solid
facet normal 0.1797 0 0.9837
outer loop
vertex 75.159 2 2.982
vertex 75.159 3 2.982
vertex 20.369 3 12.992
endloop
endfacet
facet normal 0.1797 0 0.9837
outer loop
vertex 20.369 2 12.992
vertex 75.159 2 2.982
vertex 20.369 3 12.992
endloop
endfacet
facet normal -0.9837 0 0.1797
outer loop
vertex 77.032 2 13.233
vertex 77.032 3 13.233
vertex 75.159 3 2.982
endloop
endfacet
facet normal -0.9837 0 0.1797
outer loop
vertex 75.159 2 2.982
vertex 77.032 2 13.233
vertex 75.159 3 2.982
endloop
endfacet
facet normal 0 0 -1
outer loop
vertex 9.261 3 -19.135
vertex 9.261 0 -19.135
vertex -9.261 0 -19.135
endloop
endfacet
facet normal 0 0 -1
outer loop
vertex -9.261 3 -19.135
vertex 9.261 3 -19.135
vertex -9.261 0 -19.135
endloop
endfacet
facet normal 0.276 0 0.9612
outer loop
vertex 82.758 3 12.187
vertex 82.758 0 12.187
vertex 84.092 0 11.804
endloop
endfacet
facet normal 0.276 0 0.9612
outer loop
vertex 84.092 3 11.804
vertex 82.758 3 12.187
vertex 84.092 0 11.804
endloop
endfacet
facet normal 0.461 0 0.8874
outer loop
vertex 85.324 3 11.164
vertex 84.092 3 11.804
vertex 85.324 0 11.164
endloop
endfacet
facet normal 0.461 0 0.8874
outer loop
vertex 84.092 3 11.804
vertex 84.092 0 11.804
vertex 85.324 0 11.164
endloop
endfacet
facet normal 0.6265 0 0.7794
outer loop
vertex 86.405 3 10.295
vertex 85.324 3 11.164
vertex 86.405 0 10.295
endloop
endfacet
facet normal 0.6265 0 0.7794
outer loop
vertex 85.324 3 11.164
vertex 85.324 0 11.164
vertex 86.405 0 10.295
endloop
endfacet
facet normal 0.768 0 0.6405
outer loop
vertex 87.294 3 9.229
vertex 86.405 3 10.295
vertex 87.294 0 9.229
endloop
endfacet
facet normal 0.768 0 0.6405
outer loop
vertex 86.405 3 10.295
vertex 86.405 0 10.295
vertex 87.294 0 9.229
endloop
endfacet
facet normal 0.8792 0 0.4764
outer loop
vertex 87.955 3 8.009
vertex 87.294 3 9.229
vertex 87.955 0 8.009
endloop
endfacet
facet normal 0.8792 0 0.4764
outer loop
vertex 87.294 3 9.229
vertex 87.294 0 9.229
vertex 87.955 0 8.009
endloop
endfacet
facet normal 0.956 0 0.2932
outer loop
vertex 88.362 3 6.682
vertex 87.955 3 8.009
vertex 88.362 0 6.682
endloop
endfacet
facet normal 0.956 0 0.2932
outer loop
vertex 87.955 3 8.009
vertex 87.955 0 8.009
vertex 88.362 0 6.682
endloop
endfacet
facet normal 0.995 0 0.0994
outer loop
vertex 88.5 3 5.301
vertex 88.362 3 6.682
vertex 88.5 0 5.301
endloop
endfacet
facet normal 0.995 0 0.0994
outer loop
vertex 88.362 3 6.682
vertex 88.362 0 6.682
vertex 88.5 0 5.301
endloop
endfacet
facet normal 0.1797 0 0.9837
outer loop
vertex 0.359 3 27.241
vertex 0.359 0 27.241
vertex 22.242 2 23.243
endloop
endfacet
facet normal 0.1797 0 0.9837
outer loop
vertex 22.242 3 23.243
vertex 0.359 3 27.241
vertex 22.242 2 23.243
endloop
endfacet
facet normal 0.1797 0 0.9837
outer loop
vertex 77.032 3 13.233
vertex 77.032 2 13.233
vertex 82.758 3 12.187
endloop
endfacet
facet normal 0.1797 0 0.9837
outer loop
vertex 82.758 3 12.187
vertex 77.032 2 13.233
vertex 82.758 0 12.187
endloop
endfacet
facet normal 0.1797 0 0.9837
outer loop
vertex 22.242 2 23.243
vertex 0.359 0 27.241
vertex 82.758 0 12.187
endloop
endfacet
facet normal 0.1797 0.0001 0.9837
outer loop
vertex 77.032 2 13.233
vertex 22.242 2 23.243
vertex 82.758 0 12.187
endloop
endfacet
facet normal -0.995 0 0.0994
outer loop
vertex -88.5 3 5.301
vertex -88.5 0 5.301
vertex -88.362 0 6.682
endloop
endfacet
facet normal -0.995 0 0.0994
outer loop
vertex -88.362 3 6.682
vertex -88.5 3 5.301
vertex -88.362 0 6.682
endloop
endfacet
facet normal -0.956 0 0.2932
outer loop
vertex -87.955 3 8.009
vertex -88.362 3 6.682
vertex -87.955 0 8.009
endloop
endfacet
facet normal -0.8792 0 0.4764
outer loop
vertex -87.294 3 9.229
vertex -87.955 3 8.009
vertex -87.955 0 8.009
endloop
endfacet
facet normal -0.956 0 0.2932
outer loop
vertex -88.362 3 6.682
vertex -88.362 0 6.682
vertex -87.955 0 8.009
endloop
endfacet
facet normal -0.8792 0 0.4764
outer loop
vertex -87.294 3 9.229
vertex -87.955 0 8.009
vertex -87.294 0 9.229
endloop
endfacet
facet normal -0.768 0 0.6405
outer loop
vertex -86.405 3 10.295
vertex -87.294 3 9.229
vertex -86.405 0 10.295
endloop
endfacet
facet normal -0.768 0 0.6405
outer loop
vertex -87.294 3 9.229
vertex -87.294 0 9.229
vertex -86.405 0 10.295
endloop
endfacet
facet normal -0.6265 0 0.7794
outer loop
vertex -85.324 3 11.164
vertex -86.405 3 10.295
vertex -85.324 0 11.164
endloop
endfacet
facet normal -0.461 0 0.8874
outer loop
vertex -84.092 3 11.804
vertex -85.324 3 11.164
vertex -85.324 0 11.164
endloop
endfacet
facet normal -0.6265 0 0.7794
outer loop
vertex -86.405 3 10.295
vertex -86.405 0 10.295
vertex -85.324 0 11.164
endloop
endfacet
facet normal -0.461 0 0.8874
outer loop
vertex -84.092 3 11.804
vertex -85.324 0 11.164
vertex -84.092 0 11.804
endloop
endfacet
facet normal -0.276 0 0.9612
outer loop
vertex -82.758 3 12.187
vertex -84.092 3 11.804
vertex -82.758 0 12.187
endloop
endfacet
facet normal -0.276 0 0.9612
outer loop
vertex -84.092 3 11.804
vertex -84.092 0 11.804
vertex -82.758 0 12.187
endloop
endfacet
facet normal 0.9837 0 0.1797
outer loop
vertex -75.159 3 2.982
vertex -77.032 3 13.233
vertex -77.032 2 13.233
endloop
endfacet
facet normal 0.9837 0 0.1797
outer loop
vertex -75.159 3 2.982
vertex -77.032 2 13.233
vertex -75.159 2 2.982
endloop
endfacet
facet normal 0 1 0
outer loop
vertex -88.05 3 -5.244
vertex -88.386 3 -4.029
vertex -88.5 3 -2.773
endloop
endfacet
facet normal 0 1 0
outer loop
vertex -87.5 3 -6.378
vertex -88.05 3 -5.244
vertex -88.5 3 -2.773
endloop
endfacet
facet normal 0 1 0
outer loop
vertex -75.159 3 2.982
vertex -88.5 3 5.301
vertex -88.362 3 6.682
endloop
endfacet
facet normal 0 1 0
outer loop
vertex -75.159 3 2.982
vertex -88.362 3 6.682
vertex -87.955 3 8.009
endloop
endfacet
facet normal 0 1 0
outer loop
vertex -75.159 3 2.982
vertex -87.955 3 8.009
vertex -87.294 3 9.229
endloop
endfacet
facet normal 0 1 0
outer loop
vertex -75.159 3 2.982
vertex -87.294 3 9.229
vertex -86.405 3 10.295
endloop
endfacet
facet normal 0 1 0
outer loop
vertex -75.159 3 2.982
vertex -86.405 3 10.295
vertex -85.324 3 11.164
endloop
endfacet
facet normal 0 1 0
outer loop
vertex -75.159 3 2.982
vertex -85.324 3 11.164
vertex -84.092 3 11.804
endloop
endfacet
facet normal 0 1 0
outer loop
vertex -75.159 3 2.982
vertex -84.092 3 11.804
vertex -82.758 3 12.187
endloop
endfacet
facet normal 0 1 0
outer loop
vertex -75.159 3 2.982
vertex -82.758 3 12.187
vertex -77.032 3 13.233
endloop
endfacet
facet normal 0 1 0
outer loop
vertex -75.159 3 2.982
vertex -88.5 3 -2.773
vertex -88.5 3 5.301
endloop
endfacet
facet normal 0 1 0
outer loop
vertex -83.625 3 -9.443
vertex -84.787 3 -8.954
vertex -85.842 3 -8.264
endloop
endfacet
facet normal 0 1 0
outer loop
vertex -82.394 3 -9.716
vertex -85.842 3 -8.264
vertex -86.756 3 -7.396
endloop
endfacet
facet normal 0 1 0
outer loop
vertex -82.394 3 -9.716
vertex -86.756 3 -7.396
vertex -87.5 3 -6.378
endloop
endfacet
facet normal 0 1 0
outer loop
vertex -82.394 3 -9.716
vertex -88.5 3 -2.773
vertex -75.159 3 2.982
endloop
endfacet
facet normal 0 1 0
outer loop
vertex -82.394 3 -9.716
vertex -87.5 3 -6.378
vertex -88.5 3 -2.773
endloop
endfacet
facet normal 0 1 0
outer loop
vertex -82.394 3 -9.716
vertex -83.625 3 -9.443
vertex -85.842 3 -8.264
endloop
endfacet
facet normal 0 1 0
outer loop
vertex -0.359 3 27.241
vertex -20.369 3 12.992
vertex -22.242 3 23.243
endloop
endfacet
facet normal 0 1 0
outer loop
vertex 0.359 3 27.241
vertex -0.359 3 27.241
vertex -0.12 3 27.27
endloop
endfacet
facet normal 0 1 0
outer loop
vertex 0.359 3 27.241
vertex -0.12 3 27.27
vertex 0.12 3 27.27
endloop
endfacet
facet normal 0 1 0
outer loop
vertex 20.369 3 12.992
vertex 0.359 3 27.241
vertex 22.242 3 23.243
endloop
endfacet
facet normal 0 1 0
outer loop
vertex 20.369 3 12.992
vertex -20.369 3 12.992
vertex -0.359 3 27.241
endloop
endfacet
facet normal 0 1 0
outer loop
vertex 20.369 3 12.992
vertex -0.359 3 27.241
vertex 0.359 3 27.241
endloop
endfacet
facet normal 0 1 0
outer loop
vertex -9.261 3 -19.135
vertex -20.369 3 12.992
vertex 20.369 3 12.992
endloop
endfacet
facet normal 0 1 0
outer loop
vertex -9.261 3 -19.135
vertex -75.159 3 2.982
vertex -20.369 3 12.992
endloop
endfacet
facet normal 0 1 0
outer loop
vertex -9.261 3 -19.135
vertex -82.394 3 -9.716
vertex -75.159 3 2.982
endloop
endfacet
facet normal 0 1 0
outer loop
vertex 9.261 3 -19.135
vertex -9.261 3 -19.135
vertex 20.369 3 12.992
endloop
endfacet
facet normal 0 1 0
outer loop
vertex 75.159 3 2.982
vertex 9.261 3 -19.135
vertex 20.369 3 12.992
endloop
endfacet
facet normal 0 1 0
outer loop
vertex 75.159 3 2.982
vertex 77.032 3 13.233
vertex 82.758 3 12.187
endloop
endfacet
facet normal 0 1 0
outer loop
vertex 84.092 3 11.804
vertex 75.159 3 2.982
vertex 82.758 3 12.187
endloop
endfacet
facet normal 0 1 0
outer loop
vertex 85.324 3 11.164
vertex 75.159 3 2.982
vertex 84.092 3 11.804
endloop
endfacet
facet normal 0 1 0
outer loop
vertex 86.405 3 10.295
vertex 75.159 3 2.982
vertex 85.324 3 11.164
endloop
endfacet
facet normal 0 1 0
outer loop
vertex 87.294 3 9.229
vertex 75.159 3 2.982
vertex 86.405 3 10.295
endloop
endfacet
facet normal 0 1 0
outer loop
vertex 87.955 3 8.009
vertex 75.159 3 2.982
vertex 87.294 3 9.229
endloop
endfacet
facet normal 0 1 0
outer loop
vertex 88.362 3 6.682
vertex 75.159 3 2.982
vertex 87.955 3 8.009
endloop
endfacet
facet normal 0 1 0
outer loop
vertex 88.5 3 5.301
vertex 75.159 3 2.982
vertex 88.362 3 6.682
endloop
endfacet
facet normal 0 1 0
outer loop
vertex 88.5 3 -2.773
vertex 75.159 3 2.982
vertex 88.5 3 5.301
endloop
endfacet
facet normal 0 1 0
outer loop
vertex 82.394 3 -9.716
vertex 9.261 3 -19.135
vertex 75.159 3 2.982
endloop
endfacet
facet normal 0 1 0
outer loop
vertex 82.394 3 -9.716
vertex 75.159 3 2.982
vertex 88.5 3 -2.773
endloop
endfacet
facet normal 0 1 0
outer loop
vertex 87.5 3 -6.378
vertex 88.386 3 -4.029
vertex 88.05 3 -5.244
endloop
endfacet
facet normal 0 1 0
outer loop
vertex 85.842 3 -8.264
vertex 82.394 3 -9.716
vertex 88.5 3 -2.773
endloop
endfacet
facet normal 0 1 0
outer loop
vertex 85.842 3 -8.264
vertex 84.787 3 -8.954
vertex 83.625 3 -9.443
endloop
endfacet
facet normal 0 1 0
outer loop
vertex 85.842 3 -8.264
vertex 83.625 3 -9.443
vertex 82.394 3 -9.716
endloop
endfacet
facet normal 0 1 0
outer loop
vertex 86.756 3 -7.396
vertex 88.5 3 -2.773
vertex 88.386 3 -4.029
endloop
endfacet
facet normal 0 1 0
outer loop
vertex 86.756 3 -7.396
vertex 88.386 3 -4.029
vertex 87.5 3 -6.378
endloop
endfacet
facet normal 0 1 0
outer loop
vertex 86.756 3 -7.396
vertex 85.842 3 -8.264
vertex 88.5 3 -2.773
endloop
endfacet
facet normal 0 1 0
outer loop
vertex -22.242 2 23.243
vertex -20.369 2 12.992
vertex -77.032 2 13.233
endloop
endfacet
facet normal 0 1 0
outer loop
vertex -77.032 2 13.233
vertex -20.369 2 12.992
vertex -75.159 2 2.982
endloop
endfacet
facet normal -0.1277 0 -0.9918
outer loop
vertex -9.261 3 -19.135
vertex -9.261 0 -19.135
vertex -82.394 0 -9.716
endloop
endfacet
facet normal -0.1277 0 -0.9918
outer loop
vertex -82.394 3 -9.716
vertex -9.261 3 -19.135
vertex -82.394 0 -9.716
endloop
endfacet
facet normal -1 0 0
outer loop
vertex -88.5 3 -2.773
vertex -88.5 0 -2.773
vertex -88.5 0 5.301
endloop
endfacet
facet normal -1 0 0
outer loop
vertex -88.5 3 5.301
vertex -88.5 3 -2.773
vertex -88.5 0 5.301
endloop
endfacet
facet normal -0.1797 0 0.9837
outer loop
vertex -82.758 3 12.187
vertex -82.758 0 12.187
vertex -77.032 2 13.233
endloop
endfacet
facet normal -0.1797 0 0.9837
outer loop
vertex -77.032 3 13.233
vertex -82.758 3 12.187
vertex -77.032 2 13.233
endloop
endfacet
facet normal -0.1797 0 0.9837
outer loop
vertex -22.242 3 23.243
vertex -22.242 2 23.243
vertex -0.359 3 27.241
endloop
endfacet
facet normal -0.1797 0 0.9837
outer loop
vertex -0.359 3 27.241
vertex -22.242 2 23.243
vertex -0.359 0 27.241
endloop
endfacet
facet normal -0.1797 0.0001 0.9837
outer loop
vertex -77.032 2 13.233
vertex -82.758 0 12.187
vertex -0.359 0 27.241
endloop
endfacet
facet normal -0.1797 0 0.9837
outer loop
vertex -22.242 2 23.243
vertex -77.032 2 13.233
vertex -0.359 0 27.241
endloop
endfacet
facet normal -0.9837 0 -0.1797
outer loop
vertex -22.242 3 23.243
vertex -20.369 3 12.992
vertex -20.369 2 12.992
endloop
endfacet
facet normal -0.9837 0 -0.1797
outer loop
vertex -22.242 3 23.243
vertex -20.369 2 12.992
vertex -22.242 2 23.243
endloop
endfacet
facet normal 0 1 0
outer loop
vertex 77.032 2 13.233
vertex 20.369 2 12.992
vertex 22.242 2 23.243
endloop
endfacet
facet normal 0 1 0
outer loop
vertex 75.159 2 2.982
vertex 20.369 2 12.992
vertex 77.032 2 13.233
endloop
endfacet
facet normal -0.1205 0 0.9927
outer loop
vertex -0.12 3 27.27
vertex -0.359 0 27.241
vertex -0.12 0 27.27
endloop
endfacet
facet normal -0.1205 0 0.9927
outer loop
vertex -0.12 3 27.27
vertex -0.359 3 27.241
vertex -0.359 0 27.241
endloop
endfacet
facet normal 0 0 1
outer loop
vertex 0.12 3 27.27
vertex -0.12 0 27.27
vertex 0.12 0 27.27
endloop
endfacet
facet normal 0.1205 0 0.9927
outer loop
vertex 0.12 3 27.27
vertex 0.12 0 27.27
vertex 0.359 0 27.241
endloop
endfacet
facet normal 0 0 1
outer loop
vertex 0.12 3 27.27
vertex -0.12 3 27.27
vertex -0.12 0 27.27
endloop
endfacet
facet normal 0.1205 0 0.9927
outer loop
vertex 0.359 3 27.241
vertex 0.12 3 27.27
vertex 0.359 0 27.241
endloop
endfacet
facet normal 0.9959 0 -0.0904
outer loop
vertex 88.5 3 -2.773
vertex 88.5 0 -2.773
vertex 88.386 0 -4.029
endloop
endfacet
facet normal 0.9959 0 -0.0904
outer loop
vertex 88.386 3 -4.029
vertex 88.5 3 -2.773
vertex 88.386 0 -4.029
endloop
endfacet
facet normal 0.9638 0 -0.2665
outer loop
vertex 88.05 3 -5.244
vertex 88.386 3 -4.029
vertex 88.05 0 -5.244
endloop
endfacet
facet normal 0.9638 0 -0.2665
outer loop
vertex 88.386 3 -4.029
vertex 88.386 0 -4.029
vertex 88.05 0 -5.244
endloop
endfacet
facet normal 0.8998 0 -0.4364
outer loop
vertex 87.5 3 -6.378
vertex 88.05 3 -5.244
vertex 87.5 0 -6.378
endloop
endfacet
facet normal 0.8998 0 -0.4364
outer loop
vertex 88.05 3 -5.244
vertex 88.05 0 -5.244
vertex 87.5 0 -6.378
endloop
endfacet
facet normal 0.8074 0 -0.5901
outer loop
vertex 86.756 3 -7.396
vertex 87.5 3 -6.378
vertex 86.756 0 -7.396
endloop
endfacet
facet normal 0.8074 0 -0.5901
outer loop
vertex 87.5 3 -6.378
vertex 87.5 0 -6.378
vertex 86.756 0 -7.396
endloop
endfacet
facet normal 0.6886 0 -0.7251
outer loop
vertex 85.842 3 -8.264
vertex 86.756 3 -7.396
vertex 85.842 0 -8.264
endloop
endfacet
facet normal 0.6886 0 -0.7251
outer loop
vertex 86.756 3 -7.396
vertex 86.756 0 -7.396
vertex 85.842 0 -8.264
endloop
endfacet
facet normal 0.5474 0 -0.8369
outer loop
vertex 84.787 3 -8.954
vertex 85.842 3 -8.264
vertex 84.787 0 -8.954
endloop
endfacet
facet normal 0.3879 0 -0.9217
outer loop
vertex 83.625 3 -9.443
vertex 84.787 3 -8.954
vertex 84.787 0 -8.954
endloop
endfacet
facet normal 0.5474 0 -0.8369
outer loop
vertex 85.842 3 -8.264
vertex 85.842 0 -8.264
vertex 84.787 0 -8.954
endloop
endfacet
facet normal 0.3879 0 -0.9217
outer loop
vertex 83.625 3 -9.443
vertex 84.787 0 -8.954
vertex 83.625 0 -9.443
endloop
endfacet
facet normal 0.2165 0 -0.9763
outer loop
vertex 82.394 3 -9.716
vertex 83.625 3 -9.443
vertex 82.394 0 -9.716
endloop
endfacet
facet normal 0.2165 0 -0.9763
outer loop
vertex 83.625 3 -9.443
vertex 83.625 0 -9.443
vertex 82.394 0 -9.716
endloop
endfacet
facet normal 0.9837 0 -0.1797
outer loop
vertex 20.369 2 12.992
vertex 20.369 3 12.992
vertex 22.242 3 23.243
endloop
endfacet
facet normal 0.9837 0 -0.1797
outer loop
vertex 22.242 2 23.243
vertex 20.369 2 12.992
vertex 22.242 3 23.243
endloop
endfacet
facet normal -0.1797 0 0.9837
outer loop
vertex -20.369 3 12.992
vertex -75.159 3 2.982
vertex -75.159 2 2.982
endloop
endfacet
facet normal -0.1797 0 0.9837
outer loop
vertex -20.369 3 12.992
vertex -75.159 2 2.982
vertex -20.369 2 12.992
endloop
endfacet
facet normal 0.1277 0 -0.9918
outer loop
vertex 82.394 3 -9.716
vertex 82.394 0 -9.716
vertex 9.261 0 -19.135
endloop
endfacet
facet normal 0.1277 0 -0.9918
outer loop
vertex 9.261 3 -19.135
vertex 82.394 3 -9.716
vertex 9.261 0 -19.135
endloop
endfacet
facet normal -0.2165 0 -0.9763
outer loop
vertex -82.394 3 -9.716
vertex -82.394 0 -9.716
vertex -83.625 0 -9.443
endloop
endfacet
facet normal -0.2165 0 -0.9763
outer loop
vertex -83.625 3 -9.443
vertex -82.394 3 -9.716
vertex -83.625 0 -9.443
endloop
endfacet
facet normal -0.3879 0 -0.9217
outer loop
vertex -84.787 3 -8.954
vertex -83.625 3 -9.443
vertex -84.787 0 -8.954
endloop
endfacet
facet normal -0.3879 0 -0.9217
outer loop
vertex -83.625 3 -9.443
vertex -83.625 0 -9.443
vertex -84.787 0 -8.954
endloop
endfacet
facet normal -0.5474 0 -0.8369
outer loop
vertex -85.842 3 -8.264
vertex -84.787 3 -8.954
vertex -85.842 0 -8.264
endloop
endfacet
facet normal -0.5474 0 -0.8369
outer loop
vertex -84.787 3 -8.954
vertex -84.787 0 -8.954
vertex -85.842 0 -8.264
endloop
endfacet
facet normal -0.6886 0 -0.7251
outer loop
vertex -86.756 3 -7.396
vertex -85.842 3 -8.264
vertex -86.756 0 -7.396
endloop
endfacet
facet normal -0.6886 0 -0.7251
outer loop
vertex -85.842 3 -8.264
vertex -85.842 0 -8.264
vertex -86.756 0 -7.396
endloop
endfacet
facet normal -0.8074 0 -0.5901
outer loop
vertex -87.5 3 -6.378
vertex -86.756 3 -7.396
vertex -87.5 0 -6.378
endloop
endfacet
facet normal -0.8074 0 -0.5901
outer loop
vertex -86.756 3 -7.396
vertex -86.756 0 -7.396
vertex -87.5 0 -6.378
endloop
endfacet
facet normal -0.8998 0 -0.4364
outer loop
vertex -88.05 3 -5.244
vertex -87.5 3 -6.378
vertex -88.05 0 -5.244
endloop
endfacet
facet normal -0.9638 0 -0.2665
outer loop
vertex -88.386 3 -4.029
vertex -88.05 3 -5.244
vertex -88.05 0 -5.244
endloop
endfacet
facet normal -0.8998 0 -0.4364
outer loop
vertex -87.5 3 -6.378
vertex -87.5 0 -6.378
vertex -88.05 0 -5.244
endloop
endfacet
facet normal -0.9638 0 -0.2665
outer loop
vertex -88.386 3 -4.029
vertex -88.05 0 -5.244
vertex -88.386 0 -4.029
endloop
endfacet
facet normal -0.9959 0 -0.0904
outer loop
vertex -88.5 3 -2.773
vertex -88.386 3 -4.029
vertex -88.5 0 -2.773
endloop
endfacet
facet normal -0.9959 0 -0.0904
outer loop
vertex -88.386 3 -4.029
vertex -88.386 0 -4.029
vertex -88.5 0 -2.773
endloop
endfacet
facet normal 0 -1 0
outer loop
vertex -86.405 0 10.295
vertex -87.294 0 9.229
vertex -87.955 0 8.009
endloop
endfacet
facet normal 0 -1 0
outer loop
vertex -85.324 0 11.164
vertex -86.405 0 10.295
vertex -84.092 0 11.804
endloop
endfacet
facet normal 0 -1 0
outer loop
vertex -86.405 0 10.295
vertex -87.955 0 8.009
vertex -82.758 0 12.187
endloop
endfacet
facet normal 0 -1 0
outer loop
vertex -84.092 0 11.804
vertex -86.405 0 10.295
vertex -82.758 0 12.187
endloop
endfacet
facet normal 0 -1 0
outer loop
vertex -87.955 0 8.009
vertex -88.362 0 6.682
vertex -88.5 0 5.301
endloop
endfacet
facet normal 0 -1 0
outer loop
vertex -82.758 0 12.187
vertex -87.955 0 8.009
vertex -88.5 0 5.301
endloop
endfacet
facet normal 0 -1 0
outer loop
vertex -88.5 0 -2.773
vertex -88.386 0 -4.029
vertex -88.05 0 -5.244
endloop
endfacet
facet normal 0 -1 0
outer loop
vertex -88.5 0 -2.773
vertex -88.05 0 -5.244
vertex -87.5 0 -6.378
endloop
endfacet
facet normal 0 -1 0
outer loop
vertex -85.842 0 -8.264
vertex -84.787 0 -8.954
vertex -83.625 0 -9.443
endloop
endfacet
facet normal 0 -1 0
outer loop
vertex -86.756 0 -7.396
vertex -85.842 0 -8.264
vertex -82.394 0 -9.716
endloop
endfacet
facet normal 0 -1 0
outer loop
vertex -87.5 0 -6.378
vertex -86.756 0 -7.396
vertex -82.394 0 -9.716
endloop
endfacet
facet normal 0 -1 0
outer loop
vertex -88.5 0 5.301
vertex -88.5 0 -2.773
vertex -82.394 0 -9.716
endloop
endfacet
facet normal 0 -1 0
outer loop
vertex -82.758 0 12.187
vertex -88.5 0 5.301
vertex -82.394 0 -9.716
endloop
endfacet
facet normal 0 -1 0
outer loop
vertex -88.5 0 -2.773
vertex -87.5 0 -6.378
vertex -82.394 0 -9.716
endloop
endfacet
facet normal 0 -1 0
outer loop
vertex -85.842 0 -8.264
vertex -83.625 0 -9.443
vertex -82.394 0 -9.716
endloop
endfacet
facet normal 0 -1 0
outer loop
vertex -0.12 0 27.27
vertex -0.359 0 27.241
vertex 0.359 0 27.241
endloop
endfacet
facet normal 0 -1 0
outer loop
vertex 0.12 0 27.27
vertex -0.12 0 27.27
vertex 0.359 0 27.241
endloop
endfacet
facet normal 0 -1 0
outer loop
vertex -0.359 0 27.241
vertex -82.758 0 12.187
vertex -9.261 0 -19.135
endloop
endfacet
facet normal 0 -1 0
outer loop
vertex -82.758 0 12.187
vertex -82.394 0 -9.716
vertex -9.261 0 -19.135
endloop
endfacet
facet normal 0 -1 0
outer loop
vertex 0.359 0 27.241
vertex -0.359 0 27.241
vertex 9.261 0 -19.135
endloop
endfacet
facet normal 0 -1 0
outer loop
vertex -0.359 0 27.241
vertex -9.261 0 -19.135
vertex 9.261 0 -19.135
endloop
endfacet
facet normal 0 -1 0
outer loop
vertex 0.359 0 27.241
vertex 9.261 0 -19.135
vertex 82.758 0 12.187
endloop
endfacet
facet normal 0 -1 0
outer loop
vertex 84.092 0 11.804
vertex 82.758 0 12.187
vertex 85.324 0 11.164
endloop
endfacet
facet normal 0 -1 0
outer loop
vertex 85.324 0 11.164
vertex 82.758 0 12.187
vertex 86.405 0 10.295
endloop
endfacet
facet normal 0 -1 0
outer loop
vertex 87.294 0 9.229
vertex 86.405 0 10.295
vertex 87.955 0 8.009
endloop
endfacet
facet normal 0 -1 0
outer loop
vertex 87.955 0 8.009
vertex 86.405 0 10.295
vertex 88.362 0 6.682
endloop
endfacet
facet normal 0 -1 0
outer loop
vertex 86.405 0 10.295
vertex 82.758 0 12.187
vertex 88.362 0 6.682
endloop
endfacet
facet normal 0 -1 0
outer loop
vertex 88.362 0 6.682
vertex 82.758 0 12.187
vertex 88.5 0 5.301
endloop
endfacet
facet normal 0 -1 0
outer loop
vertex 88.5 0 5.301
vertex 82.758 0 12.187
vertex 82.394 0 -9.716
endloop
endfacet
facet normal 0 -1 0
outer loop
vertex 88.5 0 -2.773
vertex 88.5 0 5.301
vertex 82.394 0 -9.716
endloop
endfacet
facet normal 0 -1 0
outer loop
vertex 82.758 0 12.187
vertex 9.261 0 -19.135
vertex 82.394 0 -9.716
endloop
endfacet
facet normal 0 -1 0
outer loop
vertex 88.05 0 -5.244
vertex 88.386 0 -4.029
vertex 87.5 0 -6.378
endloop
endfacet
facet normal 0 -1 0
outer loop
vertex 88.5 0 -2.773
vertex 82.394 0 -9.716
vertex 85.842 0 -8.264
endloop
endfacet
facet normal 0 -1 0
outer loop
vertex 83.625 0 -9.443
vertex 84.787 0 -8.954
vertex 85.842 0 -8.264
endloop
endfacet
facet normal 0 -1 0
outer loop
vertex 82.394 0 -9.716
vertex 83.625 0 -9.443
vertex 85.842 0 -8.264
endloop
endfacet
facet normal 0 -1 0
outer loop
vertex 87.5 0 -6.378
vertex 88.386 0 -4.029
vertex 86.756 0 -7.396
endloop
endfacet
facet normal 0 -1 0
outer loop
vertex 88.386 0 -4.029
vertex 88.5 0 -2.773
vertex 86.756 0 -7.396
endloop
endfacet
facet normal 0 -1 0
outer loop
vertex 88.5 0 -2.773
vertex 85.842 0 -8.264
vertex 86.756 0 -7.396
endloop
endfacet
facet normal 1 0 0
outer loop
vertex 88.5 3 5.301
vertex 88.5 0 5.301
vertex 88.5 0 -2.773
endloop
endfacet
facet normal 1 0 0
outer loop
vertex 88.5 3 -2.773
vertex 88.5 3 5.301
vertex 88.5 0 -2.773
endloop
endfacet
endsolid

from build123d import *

# Parameters (mm, degrees)
BOSS_EXTRUDE1_DEPTH = 3
FILLET2_R           = 2
CUT_EXTRUDE1_DEPTH  = 1


with BuildPart() as part:
    # Sketch1 → Boss-Extrude1 (new body)
    with BuildSketch(Plane(origin=(0, 0, 0), x_dir=(1, 0, 0), z_dir=(0, 1, 0))):
        with BuildLine():
            Line((9.261243058, 19.135372648), (-9.261243058, 19.135372648))
            Line((-9.261243058, 19.135372648), (-82.394201363, 9.715975022))
            ThreePointArc((-82.394201363, 9.715975022), (-86.756396558, 7.396125613), (-88.5, 2.773323949))
            Line((-88.5, 2.773323949), (-88.5, -5.301071921))
            ThreePointArc((-88.5, -5.301071921), (-86.876170995, -9.784015756), (-82.758061306, -12.187092669))
            Line((-82.758061306, -12.187092669), (0, -27.306813988))
            Line((0, -27.306813988), (82.758061306, -12.187092669))
            ThreePointArc((82.758061306, -12.187092669), (86.876170995, -9.784015756), (88.5, -5.301071921))
            Line((88.5, -5.301071921), (88.5, 2.773323949))
            ThreePointArc((88.5, 2.773323949), (86.756396558, 7.396125613), (82.394201363, 9.715975022))
            Line((82.394201363, 9.715975022), (9.261243058, 19.135372648))
        make_face()
    extrude(amount=BOSS_EXTRUDE1_DEPTH)

    # Fillet2
    fillet2_edges = [part.edges().sort_by_distance(p)[0] for p in [
        (0, 1.5, 27.306813988),
    ]]
    fillet(fillet2_edges, radius=FILLET2_R)

    # Sketch2 → Cut-Extrude1 (cut)
    with BuildSketch(Plane(origin=(0, 3, 0), x_dir=(1, 0, 0), z_dir=(0, 1, 0))):
        Polygon((-77.031853449, -13.233258633), (-75.158975168, -2.982026326), (-20.368957027, -12.9920458), (-22.241835309, -23.243278108), align=None)
        Polygon((20.368957027, -12.9920458), (22.241835309, -23.243278108), (77.031853449, -13.233258633), (75.158975168, -2.982026326), align=None)
    extrude(amount=-CUT_EXTRUDE1_DEPTH, mode=Mode.SUBTRACT)


solid = part.part
